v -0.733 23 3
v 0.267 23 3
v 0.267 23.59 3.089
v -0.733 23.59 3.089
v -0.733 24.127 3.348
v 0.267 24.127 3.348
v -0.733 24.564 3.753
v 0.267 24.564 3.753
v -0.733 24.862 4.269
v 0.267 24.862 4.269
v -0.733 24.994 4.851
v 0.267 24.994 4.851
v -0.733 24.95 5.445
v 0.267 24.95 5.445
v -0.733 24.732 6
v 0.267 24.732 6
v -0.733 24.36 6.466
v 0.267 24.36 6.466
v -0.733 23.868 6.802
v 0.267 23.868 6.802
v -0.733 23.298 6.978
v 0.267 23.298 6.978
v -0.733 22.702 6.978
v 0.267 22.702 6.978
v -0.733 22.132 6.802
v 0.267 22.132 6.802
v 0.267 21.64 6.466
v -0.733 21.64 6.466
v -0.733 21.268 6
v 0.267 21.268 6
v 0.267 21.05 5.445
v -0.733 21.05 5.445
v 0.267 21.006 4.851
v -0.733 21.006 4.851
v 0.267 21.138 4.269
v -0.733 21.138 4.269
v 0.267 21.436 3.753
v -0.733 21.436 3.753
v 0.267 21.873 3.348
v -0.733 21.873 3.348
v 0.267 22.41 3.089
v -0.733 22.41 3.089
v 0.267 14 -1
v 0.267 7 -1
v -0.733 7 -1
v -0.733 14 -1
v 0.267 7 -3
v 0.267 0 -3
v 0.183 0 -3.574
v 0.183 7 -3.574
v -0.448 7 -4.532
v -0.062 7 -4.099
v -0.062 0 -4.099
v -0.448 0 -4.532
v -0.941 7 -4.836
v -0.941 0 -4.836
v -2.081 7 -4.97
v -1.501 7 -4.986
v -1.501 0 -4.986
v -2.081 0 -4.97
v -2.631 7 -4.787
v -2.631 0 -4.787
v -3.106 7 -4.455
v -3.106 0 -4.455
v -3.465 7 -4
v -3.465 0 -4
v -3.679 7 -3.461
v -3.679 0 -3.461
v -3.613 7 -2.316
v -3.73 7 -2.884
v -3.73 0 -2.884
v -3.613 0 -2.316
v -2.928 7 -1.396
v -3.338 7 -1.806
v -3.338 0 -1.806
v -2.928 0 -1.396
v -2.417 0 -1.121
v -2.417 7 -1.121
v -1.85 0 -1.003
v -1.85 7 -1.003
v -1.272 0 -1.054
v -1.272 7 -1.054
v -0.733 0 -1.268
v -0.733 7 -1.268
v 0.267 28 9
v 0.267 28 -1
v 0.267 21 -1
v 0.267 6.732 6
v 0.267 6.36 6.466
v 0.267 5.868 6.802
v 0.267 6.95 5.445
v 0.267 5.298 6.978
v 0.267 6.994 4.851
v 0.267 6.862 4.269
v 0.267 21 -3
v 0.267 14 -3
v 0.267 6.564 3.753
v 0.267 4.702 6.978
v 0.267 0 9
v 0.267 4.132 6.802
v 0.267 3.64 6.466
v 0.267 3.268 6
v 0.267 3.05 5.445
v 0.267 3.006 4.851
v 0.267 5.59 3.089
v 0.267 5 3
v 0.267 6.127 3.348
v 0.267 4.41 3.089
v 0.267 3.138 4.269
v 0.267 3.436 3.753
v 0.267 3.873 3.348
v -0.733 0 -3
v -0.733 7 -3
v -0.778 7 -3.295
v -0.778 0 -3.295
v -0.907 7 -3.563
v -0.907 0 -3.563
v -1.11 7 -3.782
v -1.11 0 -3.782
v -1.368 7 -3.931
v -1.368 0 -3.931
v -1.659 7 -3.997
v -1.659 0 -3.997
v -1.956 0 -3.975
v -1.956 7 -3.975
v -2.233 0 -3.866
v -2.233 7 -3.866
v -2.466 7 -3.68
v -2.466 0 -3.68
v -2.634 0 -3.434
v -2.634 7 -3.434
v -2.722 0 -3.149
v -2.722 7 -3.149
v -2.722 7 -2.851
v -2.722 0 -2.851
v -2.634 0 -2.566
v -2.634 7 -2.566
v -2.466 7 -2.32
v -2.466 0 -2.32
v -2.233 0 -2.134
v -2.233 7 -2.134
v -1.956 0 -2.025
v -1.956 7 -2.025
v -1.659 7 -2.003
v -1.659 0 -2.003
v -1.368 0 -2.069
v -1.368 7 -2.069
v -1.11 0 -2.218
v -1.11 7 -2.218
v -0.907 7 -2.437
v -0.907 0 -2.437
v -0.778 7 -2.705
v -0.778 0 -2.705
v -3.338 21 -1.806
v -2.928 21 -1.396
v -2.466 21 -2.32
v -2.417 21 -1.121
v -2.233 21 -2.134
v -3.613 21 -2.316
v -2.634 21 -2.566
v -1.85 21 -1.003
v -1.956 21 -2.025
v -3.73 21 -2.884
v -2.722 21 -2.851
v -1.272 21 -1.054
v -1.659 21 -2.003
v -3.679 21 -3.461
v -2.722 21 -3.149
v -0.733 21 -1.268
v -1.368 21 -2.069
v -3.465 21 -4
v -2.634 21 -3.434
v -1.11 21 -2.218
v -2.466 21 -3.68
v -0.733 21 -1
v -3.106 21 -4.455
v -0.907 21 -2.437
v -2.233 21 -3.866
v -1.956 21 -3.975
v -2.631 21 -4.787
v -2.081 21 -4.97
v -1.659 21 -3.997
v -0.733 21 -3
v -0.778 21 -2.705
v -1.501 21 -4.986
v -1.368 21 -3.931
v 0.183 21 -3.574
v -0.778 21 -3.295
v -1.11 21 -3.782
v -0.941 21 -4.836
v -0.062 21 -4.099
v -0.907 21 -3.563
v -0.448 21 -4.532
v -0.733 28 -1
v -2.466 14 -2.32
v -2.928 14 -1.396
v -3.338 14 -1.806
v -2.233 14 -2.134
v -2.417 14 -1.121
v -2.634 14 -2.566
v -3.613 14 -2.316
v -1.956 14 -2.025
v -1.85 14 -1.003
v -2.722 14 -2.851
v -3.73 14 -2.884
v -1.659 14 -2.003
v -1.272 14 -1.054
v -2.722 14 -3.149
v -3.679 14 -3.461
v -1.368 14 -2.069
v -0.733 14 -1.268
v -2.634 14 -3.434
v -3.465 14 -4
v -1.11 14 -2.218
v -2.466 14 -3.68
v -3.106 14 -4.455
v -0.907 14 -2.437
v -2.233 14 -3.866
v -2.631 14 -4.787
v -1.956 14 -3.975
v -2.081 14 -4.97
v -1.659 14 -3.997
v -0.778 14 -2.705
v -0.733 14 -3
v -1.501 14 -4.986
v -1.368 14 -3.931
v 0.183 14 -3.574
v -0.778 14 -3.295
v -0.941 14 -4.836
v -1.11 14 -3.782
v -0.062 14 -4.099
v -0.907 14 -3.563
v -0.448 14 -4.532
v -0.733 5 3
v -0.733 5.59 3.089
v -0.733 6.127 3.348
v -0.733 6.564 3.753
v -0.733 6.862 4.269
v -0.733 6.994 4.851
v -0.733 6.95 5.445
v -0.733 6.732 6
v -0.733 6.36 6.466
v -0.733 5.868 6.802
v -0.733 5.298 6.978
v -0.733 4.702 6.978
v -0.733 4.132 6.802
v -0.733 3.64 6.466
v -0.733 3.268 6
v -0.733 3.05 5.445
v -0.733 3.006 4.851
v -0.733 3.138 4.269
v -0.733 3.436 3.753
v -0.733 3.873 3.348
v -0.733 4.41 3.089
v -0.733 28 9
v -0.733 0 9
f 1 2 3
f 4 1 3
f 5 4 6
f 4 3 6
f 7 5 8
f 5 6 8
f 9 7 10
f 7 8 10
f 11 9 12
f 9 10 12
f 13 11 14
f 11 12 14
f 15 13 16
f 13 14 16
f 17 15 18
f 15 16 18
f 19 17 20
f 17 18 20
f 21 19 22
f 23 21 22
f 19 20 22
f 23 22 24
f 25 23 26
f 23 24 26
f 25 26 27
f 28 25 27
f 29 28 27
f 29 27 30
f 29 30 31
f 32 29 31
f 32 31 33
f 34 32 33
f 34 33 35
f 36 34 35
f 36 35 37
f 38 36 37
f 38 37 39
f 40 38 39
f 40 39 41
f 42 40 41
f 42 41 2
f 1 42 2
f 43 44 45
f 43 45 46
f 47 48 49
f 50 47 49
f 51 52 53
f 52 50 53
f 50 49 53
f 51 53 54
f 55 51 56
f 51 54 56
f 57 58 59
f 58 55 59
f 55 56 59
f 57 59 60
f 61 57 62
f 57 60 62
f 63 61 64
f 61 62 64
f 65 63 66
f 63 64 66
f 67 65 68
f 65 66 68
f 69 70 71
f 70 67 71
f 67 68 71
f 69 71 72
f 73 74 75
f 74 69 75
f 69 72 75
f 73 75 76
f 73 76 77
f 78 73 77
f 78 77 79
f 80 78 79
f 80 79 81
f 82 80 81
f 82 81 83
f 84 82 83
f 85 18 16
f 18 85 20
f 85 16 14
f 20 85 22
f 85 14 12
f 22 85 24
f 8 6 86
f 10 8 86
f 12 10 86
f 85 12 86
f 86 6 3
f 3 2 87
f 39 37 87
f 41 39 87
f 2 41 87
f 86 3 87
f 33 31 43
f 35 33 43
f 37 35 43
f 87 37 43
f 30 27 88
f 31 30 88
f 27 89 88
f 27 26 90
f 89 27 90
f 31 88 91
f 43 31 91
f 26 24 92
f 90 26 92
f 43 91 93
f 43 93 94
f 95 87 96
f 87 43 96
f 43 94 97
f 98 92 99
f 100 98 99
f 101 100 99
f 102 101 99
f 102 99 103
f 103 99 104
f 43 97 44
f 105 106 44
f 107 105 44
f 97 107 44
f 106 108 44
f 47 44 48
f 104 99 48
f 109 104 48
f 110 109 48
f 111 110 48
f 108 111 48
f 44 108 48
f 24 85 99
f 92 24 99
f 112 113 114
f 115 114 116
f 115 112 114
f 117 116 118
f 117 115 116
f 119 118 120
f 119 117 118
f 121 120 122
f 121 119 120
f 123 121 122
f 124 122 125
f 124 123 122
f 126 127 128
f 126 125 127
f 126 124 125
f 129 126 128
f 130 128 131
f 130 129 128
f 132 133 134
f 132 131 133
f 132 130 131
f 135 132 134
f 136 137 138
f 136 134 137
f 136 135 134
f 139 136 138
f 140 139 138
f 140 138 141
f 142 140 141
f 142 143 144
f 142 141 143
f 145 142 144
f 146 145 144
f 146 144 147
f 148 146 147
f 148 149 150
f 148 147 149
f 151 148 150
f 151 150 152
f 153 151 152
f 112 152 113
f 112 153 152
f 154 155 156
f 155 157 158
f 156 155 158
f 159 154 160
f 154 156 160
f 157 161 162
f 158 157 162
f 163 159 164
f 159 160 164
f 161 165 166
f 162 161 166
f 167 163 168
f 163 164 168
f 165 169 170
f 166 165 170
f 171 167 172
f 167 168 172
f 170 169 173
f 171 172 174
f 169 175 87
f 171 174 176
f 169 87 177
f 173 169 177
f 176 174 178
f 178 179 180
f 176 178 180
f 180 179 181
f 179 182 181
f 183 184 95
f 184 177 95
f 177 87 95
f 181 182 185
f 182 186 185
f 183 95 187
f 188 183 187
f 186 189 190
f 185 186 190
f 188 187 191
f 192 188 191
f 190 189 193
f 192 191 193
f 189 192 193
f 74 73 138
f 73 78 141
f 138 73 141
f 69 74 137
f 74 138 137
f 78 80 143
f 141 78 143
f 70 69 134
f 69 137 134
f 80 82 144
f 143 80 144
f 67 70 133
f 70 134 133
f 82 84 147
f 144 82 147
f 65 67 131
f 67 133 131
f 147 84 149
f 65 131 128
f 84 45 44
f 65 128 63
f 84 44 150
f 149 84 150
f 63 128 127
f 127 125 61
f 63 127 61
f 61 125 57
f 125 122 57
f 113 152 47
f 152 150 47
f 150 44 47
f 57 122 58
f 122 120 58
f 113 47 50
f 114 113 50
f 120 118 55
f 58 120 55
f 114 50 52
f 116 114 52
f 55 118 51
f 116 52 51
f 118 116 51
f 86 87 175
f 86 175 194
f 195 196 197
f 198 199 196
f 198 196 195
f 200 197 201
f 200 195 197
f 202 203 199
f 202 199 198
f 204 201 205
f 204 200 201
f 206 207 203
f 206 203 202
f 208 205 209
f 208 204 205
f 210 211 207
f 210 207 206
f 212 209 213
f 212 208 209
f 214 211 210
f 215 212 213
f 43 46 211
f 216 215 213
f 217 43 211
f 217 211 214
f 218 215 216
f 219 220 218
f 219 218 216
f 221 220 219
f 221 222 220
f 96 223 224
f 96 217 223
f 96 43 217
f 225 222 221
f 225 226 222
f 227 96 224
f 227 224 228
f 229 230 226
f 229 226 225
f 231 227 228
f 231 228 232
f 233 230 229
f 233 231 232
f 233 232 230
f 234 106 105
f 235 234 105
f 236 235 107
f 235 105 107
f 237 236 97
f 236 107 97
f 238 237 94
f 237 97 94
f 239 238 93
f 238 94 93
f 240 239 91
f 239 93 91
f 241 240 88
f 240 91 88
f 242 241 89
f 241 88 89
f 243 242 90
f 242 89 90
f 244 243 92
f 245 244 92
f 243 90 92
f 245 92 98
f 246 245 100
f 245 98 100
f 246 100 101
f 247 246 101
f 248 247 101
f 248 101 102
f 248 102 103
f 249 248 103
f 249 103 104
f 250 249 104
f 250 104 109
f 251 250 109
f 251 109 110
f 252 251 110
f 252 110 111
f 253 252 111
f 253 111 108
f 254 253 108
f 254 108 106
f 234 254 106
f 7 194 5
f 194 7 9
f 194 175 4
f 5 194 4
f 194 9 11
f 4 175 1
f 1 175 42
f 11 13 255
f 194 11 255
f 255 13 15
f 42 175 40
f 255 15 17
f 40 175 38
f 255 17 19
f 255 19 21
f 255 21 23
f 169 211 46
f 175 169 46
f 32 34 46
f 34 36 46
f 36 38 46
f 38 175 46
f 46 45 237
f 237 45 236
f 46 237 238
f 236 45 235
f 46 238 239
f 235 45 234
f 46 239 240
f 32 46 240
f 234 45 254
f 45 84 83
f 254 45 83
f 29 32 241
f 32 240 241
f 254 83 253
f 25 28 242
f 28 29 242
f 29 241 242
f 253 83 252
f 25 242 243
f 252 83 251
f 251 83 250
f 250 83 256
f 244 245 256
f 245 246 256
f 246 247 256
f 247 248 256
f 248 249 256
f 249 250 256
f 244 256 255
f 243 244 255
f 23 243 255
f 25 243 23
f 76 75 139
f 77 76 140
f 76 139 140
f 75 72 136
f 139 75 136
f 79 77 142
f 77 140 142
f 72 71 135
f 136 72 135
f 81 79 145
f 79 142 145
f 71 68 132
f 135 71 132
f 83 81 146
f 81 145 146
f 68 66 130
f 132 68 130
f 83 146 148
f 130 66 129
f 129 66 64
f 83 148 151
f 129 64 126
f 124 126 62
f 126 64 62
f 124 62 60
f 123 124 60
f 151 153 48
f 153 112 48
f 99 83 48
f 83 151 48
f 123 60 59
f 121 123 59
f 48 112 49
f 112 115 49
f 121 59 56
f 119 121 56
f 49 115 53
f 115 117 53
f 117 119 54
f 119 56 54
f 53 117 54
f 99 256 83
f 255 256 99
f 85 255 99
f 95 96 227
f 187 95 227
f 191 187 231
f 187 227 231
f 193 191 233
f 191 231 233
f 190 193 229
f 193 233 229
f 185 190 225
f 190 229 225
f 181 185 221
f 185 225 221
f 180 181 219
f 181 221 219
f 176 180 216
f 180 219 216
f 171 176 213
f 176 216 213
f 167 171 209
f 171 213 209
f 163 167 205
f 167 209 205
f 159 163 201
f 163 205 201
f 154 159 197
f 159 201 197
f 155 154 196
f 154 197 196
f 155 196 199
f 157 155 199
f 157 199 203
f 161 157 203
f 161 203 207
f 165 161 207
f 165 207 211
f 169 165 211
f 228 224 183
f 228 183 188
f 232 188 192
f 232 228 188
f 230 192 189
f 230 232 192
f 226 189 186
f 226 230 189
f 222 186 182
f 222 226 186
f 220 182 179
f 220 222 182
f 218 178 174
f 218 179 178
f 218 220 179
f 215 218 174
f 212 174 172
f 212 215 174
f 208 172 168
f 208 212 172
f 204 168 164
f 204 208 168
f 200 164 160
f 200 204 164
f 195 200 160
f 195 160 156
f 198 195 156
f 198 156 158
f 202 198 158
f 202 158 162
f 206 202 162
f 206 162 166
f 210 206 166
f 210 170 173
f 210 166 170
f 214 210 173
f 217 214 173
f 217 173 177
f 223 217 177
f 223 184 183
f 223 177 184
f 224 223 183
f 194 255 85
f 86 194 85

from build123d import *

# Parameters (mm, degrees)
SKETCH1_R           = 1
BOSS_EXTRUDE1_DEPTH = 28
SKETCH2_W           = 5.706880649
SKETCH2_H           = 7
CUT_EXTRUDE1_DEPTH  = 5
SKETCH3_R           = 2
CUT_EXTRUDE2_DEPTH  = 5


with BuildPart() as part:
    # Sketch1 → Boss-Extrude1 (new body)
    with BuildSketch(Plane(origin=(0, 0, 0), x_dir=(1, 0, 0), z_dir=(0, 1, 0))):
        with BuildLine():
            ThreePointArc((0.266683504, 3), (-3.465367303, 4), (-0.733316496, 1.267949192))
            Line((-0.733316496, 1.267949192), (-0.733316496, -9))
            Line((-0.733316496, -9), (0.266683504, -9))
            Line((0.266683504, -9), (0.266683504, 3))
        make_face()
        with Locations((-1.733316496, 3)):
            Circle(SKETCH1_R, mode=Mode.SUBTRACT)
    extrude(amount=BOSS_EXTRUDE1_DEPTH)

    # Sketch2 → Cut-Extrude1 (cut, through all)
    with BuildSketch(Plane(origin=(0.266683504, 0, 0), x_dir=(0, 0, -1), z_dir=(1, 0, 0))):
        with Locations((3.853440325, 24.5)):
            Rectangle(SKETCH2_W, SKETCH2_H)
        with Locations((3.853440325, 10.5)):
            Rectangle(SKETCH2_W, SKETCH2_H)
    extrude(amount=-CUT_EXTRUDE1_DEPTH, mode=Mode.SUBTRACT)

    # Sketch3 → Cut-Extrude2 (cut, through all)
    with BuildSketch(Plane(origin=(0.266683504, 0, 0), x_dir=(0, 0, -1), z_dir=(1, 0, 0))):
        with Locations((-5, 23)):
            Circle(SKETCH3_R)
        with Locations((-5, 5)):
            Circle(SKETCH3_R)
    extrude(amount=-CUT_EXTRUDE2_DEPTH, mode=Mode.SUBTRACT)


solid = part.part
